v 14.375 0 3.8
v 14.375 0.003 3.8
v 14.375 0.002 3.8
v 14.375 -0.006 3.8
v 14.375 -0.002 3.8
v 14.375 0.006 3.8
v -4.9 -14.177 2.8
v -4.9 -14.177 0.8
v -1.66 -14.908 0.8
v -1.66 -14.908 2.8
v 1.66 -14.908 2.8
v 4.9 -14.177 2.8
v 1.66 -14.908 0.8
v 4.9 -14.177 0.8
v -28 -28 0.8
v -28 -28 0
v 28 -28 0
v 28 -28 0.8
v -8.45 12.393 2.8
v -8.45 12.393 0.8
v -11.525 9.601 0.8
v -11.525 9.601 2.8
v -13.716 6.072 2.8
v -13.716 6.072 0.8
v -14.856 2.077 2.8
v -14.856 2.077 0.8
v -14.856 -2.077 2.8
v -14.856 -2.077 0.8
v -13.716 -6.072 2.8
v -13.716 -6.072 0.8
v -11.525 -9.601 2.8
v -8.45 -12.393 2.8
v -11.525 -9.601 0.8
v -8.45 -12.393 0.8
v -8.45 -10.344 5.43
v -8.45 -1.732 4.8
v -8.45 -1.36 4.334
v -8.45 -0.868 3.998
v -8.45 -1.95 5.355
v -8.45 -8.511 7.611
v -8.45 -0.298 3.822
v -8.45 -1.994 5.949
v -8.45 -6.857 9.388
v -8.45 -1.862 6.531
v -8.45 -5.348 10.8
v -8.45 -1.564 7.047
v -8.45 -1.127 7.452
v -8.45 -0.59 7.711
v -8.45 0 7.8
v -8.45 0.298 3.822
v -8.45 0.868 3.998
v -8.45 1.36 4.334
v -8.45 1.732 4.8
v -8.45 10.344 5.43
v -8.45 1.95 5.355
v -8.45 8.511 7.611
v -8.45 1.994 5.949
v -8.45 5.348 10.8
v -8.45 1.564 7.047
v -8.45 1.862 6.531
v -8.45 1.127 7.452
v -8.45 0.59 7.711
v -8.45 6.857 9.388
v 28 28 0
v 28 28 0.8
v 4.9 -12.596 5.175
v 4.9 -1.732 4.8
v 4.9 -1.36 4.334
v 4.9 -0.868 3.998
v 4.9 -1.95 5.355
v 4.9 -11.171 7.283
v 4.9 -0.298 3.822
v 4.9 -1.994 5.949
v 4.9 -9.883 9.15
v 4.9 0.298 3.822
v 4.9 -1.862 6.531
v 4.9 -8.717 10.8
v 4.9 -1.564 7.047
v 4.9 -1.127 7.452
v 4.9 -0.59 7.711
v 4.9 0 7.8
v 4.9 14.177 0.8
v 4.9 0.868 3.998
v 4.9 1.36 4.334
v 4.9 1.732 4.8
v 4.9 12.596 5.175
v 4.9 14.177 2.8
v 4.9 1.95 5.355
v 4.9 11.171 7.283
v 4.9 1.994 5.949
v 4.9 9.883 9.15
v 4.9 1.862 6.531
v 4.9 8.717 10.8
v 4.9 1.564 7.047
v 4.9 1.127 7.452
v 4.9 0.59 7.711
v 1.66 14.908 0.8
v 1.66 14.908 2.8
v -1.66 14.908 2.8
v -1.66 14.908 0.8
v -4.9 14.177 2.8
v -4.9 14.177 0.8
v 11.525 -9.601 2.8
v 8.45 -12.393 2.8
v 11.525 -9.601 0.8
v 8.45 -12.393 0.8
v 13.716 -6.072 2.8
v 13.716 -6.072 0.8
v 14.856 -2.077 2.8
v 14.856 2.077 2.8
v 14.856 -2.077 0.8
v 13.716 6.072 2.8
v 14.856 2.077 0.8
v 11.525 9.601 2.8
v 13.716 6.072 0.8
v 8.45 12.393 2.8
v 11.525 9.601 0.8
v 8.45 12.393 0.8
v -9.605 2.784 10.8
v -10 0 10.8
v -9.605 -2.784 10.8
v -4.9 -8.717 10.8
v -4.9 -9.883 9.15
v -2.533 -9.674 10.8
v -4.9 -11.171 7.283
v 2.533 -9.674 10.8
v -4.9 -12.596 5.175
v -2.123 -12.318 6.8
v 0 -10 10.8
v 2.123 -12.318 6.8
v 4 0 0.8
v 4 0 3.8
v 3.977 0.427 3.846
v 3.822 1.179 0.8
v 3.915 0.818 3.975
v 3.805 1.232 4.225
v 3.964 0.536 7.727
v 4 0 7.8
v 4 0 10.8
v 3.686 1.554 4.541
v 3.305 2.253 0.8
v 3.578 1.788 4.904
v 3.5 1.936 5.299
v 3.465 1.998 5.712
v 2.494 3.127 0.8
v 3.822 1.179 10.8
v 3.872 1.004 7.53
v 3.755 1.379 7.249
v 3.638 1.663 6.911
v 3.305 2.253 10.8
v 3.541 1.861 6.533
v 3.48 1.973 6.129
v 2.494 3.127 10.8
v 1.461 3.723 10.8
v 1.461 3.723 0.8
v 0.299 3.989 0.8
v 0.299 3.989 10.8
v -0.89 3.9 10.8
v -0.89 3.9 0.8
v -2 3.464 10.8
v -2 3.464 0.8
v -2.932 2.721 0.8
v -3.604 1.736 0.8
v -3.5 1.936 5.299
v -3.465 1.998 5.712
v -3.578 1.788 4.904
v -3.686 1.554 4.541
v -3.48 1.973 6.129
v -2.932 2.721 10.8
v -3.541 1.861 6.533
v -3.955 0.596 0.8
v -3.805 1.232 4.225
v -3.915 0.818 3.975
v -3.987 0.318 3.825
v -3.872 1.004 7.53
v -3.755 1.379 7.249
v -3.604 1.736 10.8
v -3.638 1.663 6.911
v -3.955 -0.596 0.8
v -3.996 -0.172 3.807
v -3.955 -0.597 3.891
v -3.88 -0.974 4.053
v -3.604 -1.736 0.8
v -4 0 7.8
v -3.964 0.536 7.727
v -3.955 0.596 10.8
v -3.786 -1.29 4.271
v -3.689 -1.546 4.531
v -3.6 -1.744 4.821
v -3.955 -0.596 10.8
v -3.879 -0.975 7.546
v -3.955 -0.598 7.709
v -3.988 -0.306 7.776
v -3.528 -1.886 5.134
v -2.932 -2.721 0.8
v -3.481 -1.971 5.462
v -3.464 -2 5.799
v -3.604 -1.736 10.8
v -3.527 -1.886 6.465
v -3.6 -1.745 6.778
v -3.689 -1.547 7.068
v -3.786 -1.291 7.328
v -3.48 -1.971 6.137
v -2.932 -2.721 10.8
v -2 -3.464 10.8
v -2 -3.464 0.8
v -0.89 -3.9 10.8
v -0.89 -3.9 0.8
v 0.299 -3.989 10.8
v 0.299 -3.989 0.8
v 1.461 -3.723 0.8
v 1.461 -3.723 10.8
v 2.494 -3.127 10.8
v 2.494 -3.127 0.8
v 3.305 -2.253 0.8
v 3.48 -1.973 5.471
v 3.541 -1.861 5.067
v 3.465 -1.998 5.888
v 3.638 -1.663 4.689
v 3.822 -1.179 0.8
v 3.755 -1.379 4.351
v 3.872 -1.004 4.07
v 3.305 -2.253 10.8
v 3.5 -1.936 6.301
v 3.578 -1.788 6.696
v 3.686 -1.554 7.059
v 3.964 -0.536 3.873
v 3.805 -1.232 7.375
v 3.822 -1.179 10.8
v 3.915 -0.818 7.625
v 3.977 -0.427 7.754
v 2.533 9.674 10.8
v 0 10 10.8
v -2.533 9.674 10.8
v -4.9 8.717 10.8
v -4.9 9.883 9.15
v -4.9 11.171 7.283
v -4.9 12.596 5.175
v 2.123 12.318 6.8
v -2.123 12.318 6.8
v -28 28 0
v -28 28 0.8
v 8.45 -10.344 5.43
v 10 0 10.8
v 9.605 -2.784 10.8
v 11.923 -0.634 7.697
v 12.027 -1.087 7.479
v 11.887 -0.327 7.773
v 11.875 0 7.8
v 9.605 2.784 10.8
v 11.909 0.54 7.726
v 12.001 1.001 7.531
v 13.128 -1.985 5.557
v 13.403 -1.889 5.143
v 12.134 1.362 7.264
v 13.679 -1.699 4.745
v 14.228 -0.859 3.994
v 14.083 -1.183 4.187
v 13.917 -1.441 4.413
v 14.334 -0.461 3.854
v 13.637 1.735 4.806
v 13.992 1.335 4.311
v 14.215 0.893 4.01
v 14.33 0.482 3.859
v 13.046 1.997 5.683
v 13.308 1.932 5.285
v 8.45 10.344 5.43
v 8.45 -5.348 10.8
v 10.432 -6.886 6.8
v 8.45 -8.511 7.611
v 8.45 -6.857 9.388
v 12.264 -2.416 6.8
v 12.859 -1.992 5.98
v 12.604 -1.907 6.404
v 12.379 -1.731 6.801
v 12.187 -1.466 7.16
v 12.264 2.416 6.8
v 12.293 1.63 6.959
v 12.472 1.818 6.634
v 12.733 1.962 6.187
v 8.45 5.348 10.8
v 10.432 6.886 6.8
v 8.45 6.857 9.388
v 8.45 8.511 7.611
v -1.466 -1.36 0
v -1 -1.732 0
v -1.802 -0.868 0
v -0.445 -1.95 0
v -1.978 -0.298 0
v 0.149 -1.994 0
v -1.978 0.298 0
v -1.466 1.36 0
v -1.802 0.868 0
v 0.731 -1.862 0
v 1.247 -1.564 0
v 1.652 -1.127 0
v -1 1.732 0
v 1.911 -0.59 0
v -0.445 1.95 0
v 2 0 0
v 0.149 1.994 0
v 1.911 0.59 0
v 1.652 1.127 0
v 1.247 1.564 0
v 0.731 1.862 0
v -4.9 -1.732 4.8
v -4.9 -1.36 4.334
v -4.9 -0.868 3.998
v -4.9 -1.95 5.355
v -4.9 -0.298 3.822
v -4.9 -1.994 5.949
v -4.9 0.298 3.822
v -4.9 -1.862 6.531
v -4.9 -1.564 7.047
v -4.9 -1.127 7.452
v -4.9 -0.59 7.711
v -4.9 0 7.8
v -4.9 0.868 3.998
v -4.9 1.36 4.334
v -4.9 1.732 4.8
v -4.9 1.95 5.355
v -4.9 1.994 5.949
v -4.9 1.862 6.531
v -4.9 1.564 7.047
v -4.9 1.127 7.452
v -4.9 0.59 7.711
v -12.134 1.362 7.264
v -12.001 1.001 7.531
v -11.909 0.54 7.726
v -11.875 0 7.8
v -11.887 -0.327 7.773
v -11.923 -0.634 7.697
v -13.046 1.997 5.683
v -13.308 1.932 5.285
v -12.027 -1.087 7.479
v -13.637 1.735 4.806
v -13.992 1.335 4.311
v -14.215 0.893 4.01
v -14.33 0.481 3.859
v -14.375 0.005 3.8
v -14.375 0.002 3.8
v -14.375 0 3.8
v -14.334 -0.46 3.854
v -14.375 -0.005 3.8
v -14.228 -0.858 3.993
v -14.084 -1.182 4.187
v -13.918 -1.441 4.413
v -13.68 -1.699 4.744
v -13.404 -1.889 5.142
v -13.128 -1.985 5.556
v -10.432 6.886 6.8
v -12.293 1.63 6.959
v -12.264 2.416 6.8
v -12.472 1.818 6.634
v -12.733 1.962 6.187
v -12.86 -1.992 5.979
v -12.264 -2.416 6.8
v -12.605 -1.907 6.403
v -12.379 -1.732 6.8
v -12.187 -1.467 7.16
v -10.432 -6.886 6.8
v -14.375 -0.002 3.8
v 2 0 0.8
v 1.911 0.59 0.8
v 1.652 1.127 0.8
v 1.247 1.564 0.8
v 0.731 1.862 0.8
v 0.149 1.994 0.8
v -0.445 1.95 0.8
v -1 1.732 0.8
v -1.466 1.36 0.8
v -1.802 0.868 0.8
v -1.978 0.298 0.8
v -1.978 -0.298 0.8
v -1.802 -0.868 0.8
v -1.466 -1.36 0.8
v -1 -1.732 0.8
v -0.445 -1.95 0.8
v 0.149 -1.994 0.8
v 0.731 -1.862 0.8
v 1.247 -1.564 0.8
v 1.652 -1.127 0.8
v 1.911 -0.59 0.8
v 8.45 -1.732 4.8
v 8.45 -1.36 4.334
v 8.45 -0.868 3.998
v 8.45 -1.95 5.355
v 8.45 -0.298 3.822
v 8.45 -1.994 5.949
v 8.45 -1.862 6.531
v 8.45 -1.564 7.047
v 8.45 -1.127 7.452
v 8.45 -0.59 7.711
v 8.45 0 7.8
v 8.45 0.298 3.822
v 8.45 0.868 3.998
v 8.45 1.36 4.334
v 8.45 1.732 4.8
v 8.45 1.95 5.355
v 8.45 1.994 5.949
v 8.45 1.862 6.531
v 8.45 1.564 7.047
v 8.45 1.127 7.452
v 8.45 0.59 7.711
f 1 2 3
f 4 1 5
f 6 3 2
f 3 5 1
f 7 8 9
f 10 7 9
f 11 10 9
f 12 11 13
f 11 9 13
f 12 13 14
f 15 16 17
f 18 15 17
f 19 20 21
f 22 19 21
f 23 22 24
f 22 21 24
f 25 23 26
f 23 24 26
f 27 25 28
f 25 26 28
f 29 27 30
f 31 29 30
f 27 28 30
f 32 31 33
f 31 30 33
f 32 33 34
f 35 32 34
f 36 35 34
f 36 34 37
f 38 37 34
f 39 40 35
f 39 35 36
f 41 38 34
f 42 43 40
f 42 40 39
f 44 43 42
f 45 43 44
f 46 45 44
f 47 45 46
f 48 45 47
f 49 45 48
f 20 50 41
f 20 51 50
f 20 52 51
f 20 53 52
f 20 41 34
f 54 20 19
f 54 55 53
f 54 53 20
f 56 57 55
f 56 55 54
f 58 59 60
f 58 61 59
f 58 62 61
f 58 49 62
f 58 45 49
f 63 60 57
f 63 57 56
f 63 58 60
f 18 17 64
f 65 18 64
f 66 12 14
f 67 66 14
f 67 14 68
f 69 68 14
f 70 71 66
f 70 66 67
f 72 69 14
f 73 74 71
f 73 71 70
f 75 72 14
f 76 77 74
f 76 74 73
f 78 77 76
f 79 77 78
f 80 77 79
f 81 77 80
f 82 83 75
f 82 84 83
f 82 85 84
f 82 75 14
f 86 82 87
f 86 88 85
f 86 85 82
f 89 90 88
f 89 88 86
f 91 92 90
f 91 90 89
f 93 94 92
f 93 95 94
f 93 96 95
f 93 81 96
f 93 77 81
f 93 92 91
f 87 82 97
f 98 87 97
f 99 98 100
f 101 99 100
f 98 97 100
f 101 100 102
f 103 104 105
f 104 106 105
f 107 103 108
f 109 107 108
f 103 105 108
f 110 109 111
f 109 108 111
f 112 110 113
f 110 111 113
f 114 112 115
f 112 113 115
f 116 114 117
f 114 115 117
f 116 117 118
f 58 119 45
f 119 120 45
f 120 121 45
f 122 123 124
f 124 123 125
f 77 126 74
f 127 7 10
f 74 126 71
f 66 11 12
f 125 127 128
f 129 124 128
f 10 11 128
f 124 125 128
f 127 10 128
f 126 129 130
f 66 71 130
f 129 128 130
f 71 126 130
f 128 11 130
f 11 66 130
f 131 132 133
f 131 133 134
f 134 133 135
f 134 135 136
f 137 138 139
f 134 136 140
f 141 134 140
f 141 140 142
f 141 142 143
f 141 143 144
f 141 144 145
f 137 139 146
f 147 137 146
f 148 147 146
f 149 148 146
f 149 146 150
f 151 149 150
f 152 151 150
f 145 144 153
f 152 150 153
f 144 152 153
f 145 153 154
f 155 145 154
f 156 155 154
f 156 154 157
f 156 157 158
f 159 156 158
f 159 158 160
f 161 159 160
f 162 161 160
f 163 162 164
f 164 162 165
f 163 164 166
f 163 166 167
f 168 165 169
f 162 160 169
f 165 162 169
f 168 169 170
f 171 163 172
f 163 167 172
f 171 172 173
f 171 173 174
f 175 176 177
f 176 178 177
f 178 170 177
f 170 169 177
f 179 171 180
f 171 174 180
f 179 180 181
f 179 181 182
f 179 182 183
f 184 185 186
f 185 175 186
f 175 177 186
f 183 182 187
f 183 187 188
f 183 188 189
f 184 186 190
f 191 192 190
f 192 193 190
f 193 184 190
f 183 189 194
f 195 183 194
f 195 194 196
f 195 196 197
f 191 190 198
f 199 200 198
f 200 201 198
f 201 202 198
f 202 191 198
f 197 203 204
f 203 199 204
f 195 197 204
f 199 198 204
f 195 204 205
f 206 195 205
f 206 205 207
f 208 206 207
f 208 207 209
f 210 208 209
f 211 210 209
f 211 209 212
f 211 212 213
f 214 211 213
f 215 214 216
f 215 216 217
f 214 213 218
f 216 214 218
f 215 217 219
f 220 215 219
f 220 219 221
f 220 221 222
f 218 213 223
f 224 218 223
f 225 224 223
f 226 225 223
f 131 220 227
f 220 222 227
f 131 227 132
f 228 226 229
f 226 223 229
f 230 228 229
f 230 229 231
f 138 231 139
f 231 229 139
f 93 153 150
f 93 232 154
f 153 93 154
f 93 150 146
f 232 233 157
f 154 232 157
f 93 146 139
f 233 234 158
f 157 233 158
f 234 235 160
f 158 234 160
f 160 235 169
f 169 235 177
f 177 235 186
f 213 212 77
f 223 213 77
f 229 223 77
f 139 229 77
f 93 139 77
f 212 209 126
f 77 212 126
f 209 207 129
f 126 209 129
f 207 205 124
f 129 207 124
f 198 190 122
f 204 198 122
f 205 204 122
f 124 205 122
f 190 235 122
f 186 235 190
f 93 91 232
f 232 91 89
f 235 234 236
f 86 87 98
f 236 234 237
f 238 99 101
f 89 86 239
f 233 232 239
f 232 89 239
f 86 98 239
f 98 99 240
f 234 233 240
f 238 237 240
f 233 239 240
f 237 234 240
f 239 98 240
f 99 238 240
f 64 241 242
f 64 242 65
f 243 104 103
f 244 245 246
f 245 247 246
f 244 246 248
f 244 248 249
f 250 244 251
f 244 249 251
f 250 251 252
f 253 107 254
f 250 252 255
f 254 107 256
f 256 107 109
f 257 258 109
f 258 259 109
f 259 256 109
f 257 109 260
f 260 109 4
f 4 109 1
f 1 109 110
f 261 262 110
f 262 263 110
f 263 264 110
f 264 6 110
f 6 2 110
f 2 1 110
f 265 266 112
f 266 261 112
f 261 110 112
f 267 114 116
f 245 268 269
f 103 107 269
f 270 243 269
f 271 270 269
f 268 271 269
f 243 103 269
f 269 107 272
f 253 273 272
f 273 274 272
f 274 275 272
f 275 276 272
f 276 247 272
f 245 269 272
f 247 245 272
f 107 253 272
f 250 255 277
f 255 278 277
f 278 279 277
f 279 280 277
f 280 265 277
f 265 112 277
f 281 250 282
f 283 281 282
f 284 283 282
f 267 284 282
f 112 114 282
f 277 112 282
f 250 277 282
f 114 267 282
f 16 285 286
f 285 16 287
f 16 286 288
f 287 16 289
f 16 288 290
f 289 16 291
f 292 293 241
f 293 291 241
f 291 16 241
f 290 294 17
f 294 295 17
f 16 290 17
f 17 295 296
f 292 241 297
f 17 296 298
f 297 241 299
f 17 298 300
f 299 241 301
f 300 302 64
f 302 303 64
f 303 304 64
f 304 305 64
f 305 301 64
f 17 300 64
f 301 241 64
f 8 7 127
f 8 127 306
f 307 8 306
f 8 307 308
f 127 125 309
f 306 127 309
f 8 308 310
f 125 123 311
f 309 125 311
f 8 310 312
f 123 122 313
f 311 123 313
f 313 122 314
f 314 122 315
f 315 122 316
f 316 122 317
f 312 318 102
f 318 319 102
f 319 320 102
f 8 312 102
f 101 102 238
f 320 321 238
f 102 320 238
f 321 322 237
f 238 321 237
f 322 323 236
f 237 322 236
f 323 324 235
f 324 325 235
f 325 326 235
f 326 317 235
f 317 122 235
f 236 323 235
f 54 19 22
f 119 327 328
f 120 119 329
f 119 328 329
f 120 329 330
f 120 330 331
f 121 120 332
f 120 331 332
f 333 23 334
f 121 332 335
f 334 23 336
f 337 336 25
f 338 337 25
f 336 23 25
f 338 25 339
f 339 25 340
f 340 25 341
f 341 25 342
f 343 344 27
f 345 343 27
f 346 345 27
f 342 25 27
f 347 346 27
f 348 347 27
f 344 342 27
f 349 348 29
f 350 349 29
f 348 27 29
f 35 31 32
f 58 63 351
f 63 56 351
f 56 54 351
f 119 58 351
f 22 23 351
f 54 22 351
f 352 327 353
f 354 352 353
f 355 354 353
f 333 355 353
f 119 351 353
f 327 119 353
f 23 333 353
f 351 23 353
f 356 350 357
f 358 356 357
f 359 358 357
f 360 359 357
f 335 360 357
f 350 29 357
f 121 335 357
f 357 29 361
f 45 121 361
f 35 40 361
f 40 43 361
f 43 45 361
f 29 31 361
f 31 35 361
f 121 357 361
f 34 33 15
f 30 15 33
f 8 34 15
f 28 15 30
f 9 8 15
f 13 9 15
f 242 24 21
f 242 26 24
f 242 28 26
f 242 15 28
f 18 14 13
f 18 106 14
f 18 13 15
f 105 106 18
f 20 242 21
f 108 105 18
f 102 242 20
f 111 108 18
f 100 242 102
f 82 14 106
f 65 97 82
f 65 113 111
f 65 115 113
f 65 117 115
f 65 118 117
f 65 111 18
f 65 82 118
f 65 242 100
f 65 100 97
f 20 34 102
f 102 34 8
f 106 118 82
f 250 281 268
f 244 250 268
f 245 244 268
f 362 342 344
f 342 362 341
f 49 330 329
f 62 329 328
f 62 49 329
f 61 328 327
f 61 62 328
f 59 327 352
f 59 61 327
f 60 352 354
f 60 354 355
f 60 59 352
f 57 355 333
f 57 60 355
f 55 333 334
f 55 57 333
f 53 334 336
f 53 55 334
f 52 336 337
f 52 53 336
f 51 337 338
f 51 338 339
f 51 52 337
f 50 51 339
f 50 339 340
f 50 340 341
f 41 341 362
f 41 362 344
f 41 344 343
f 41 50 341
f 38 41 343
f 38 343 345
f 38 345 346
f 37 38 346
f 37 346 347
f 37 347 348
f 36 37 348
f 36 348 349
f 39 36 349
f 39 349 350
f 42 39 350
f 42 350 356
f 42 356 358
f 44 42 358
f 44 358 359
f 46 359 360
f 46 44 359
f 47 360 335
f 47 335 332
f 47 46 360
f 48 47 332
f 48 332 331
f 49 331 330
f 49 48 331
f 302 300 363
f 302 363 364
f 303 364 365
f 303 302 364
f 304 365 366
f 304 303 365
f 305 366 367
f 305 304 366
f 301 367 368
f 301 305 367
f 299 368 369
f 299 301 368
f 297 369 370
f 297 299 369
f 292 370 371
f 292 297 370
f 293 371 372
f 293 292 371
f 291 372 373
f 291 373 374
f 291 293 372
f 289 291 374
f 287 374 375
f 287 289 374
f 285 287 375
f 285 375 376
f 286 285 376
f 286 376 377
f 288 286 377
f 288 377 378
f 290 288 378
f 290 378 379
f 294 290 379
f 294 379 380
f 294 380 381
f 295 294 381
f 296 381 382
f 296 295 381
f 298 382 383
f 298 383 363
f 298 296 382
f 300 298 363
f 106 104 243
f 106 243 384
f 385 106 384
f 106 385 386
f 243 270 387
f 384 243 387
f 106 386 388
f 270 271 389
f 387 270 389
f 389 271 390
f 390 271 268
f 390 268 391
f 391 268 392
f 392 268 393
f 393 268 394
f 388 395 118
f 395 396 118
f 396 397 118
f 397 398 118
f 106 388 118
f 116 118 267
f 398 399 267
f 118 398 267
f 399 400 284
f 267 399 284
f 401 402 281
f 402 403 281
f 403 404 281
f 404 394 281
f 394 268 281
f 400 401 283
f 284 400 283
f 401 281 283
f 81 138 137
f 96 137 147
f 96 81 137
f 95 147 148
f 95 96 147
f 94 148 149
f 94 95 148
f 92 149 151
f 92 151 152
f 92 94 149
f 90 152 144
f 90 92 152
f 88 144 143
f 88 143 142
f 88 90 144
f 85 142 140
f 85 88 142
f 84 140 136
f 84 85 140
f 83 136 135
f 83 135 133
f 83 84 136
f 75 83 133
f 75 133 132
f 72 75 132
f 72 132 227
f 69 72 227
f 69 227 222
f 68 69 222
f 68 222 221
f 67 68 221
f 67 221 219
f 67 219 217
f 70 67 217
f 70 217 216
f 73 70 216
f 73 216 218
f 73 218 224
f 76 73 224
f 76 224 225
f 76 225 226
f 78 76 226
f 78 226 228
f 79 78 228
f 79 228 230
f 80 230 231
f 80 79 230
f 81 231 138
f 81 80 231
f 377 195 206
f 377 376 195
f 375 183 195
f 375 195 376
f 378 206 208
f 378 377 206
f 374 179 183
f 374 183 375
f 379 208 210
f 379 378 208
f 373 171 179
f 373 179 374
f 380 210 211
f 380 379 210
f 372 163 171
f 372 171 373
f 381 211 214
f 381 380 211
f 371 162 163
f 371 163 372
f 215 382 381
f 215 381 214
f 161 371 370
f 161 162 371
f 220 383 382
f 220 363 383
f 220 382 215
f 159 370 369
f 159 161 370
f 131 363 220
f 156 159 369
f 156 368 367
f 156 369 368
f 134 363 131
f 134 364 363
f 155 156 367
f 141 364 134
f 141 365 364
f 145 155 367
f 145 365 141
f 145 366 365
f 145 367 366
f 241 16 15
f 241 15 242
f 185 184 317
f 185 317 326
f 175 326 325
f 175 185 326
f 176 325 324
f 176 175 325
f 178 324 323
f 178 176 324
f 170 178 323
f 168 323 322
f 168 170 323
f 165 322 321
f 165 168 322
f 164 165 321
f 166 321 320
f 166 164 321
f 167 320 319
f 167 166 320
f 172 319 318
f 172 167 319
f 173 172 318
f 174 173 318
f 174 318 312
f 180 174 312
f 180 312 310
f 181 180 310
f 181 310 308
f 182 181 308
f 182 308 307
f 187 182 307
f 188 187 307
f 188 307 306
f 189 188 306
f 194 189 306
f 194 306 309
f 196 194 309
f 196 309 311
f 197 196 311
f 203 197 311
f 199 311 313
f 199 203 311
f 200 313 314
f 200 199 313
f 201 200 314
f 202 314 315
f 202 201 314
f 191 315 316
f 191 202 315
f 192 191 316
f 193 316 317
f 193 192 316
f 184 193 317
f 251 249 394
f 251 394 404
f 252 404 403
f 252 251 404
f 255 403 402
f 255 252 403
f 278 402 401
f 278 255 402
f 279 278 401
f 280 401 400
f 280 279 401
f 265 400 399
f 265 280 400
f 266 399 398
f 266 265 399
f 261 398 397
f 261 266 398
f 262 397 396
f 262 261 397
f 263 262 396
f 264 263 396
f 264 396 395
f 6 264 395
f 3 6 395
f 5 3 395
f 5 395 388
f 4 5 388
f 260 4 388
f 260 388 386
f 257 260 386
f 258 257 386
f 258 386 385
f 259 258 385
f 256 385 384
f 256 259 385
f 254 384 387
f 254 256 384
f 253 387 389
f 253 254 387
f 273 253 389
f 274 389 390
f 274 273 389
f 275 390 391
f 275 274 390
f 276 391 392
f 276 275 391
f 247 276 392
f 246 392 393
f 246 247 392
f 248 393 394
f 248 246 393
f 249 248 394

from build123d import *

# Parameters (mm, degrees)
CROQUIS1_W              = 56
CROQUIS1_H              = 56
CROQUIS1_R              = 2
SALIENTE_EXTRUIR2_DEPTH = 0.8
CROQUIS4_R              = 4
CROQUIS4_W              = 3.55
CROQUIS4_H              = 40
CORTAR_EXTRUIR1_DEPTH   = 10
CORTAR_EXTRUIR2_START   = -42.374993
CROQUIS7_R              = 2
CORTAR_EXTRUIR2_DEPTH   = 28.749989
SALIENTE_EXTRUIR4_DEPTH = 10


with BuildPart() as part:
    # Croquis1 → Saliente-Extruir2 (new body)
    with BuildSketch(Plane.XY):
        Rectangle(CROQUIS1_W, CROQUIS1_H)
        Circle(CROQUIS1_R, mode=Mode.SUBTRACT)
    extrude(amount=SALIENTE_EXTRUIR2_DEPTH)

    # Croquis2 → Revolución1 (revolve)
    with BuildSketch(Plane(origin=(0, 0, 0), x_dir=(0, 0, -1), z_dir=(1, 0, 0))):
        Polygon((-0.8, 0), (-10.8, 0), (-10.8, 10), (-2.8, 15), (-0.8, 15), align=None)
    revolve(axis=Axis((0, 0, 0.8), (0, 0, 1)))

    # Croquis4 → Cortar-Extruir1 (cut)
    with BuildSketch(Plane.XY.offset(10.8)):
        Circle(CROQUIS4_R)
        with Locations((-6.675, 0)):
            Rectangle(CROQUIS4_W, CROQUIS4_H)
        with Locations((6.675, 0)):
            Rectangle(CROQUIS4_W, CROQUIS4_H)
    extrude(amount=-CORTAR_EXTRUIR1_DEPTH, mode=Mode.SUBTRACT)

    # Croquis7 → Cortar-Extruir2 (cut)
    with BuildSketch(Plane.ZY.offset(28).offset(CORTAR_EXTRUIR2_START)):
        with Locations((5.8, 0)):
            Circle(CROQUIS7_R)
    extrude(amount=CORTAR_EXTRUIR2_DEPTH, mode=Mode.SUBTRACT)

    # Croquis3 → Saliente-Extruir4 (add)
    with BuildSketch(Plane.XY.offset(0.8)):
        with BuildLine():
            Line((23, -28), (28, -28))
            Line((28, -28), (28, -23))
            ThreePointArc((28, -23), (31.535533906, -31.535533906), (23, -28))
        make_face()
    extrude(amount=SALIENTE_EXTRUIR4_DEPTH)


with BuildPart() as saliente_extruir4_kept_piece:
    # of the separate pieces the step leaves, the one the design keeps (saliente_extruir4_pieces_kept)
    add(part.part.solids().sort_by_distance((28, -28, 0))[0])


solid = saliente_extruir4_kept_piece.part
